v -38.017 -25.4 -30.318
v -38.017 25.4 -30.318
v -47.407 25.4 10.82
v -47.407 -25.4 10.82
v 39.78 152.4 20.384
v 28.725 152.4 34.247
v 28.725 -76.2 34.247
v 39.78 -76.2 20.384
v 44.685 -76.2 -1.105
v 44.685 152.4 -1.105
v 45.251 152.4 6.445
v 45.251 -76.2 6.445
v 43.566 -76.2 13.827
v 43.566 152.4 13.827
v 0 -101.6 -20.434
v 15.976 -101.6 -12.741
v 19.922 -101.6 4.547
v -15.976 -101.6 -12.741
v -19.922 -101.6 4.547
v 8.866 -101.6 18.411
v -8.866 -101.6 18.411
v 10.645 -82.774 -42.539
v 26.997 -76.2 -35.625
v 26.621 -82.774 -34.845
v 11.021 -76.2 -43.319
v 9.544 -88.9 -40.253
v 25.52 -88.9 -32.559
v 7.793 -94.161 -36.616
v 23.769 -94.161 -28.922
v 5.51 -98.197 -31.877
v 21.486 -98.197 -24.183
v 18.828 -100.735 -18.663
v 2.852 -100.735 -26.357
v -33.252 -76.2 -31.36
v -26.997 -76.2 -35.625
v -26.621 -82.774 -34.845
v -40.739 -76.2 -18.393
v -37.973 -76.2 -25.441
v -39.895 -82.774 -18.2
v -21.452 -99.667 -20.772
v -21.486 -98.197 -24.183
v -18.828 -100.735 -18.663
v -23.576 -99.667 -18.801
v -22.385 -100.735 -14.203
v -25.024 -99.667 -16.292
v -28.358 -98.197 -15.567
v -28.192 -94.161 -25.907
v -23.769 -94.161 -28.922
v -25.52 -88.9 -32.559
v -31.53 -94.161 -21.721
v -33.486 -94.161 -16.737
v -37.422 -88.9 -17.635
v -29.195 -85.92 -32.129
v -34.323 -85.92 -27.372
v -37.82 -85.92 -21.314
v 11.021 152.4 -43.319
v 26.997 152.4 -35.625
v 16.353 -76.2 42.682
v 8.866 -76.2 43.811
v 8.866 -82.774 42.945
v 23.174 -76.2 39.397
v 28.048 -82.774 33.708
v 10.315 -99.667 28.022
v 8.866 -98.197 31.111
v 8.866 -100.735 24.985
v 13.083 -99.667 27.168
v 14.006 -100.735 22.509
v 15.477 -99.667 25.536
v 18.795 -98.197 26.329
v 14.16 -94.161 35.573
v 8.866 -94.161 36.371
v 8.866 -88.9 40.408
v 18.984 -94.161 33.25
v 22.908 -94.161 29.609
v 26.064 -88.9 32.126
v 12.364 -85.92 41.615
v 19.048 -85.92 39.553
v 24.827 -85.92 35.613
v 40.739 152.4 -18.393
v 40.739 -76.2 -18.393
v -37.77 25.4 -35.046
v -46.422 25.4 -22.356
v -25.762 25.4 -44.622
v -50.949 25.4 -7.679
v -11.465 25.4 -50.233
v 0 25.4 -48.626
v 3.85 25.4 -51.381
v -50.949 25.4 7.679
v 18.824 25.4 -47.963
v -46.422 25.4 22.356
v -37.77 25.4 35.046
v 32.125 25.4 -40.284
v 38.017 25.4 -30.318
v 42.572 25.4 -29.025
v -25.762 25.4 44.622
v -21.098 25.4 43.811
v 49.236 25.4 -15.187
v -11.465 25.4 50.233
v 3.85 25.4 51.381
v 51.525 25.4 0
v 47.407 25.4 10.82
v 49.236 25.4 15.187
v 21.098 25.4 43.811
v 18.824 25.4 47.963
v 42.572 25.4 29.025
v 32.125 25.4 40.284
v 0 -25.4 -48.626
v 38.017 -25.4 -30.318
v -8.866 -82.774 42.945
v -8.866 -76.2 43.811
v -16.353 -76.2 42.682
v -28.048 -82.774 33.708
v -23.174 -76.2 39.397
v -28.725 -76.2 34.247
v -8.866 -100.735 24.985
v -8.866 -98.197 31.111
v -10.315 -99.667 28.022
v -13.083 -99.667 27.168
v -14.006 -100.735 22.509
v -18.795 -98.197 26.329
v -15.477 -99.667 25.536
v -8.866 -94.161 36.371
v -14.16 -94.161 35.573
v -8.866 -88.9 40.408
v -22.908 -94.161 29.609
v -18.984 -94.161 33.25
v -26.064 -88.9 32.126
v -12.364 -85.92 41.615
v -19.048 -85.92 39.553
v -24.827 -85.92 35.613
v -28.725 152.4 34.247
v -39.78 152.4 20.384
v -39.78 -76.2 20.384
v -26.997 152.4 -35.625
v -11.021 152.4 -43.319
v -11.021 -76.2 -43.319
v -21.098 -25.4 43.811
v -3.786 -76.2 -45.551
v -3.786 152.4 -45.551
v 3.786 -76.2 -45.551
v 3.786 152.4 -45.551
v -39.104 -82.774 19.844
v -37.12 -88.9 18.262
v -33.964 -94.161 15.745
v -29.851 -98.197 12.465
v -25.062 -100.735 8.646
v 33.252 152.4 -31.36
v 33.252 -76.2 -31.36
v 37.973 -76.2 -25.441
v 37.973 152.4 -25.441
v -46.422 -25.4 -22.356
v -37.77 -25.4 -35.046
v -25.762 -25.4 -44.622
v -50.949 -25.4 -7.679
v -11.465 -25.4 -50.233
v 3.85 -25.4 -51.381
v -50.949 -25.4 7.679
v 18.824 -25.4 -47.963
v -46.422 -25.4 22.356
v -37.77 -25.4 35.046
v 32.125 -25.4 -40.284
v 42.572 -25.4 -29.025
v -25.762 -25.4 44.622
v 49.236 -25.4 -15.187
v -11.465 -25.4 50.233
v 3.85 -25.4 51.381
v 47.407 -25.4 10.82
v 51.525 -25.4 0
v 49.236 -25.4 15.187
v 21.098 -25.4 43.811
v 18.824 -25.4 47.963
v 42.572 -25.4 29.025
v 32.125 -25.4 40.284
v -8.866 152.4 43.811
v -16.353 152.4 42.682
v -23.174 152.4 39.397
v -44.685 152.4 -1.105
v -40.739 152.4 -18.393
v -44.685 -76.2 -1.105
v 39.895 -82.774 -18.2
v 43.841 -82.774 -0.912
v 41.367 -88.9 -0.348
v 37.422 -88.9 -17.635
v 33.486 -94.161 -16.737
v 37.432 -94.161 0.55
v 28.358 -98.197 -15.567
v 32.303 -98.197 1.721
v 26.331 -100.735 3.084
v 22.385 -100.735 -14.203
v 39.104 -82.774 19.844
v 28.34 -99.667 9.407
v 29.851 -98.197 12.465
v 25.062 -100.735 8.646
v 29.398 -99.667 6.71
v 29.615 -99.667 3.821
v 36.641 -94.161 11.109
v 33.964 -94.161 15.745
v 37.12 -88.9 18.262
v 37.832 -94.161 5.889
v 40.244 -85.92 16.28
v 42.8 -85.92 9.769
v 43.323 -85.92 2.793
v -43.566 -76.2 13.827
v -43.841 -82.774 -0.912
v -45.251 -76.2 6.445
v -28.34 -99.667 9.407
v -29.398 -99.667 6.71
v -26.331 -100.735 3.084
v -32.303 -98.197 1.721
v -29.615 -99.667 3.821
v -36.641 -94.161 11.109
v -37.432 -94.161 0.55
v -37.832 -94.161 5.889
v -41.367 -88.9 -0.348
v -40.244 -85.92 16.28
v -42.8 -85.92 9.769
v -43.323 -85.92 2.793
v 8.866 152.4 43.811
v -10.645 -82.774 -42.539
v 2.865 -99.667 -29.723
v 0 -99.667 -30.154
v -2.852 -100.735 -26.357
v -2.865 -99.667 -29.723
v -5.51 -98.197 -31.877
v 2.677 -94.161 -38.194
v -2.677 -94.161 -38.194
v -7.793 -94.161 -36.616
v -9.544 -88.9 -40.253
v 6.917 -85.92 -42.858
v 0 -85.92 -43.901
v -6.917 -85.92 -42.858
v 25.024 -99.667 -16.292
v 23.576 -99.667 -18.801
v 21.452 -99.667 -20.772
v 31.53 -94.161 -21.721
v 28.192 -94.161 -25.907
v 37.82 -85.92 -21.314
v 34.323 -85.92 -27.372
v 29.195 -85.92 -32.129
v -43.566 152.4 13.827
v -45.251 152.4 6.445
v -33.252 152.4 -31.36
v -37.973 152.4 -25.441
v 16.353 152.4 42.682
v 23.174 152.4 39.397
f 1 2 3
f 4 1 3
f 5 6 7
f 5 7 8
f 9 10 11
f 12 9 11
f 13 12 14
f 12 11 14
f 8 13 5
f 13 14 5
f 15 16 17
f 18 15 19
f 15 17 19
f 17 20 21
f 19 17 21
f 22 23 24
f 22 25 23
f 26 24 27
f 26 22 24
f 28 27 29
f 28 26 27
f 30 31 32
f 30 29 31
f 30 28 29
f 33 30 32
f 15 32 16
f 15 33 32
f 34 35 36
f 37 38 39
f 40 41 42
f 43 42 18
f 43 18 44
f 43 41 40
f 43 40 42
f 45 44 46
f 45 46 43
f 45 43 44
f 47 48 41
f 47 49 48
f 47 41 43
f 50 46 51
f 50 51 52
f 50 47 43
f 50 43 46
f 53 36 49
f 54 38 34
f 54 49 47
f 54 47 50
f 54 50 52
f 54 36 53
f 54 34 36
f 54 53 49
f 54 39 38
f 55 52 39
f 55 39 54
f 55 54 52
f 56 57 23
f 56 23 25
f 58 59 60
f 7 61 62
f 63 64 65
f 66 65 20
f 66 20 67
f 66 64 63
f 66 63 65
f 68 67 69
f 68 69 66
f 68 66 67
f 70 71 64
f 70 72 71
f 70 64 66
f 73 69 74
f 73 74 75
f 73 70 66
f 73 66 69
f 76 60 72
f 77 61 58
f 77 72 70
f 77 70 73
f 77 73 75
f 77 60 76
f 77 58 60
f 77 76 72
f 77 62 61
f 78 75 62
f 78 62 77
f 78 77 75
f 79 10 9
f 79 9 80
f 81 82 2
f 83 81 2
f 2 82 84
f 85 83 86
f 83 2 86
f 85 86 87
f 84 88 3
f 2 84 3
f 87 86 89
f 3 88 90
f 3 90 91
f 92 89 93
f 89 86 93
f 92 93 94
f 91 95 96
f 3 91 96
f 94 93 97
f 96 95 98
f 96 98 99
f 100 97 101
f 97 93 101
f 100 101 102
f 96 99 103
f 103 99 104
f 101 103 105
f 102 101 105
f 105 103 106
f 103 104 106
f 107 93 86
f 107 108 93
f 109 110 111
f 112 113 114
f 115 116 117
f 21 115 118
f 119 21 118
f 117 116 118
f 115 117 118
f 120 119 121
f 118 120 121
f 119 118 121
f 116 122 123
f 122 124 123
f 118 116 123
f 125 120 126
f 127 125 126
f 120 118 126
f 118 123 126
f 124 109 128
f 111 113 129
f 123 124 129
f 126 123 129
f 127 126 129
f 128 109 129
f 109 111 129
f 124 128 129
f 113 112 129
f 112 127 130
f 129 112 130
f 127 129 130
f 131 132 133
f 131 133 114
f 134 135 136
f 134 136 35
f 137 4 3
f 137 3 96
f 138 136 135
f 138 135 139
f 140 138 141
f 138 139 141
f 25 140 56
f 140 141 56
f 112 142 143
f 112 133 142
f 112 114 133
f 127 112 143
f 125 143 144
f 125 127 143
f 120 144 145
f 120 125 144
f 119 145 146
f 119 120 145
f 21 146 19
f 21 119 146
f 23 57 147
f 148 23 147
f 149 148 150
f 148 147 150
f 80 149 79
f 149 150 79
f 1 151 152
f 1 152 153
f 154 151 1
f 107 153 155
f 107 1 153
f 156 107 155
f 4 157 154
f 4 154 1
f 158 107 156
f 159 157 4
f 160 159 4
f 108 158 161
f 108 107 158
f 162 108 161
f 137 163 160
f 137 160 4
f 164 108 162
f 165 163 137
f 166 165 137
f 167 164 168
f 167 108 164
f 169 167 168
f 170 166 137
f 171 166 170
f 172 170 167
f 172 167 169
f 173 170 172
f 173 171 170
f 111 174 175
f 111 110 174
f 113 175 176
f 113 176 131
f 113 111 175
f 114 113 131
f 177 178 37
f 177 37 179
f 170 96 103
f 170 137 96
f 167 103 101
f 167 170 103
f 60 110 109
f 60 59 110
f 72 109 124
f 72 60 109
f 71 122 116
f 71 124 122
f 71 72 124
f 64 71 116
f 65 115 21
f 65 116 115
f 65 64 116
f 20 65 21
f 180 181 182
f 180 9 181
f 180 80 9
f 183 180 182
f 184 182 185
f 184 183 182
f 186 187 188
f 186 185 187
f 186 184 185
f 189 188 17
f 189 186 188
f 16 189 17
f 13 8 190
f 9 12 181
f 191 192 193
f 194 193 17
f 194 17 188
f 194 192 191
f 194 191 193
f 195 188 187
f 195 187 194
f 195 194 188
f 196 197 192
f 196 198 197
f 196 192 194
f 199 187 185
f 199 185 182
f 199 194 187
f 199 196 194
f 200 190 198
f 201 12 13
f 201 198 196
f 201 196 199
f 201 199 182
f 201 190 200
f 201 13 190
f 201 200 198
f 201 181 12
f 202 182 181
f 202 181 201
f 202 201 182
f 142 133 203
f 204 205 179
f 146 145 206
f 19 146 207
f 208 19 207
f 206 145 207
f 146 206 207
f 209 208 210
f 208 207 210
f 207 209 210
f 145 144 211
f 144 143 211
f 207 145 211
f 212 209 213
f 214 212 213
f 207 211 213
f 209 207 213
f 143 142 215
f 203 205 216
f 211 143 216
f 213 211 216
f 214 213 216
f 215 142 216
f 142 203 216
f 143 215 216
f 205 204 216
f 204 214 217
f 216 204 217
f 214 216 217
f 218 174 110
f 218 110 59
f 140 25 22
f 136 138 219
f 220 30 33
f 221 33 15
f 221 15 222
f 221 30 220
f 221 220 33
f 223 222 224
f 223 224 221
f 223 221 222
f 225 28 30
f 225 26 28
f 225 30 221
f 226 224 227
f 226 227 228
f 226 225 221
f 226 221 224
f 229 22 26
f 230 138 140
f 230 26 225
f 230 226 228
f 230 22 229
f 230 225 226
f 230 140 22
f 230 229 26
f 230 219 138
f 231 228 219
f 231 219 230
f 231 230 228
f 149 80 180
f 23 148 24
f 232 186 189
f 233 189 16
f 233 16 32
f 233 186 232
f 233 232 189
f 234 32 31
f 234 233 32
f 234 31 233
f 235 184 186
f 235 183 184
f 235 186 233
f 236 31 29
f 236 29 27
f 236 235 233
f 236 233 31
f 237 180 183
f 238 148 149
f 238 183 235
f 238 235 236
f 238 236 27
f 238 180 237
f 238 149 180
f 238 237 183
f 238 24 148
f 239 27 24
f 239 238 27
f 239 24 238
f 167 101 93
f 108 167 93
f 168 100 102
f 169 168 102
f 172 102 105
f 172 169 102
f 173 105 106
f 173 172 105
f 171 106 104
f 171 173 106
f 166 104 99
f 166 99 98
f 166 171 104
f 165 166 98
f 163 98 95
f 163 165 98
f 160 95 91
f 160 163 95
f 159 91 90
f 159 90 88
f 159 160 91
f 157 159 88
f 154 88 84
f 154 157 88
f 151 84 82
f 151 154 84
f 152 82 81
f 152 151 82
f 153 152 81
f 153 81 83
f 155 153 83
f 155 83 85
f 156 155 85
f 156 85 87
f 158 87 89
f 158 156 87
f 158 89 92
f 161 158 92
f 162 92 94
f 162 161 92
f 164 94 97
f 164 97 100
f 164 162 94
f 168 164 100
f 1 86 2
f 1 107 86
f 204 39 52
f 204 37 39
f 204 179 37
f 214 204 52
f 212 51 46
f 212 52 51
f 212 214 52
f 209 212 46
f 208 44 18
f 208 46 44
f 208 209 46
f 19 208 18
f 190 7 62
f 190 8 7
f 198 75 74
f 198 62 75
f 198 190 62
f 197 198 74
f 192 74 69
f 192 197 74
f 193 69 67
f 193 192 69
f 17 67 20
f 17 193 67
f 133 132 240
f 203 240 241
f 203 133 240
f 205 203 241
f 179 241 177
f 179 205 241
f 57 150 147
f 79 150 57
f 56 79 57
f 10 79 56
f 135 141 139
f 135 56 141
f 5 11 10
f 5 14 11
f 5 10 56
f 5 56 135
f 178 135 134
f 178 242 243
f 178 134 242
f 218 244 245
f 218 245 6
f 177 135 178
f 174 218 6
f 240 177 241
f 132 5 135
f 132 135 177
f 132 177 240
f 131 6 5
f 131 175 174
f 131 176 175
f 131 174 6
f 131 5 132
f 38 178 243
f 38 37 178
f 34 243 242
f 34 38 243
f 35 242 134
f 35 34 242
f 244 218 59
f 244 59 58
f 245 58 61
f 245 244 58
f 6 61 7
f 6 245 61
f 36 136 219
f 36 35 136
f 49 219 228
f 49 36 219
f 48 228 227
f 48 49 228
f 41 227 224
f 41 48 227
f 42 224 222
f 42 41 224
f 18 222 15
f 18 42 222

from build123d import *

# Parameters (mm, degrees)
F0_R     = 51.5249120955
F1_DEPTH = 25.4
F3_DEPTH = 127
F4_R     = 25.4


with BuildPart() as f1:
    # F0 (on Front) → F1 (new body, symmetric)
    with BuildSketch(Plane.XZ):
        Circle(F0_R)
        Polygon((-47.4069179748, 10.8203196687), (-21.0980633275, 43.8105799258), (21.0980633275, 43.8105799258), (47.4069179748, 10.8203196687), (38.0173964622, -30.3178619932), (0, -48.6260752025), (-38.0173964622, -30.3178619932), align=None, mode=Mode.SUBTRACT)
    extrude(amount=F1_DEPTH, both=True)


with BuildPart() as f3:
    # F2 (on face) → F3 (new body, symmetric)
    with BuildSketch(Plane(origin=(0, 25.4, 0), x_dir=(-1, 0, 0), z_dir=(0, 1, 0))):
        Polygon((21.0980633275, 43.8105799258), (-21.0980633275, 43.8105799258), (-47.4069179748, 10.8203196687), (-38.0173964622, -30.3178619932), (0, -48.6260752025), (38.0173964622, -30.3178619932), (47.4069179748, 10.8203196687), align=None)
    extrude(amount=F3_DEPTH, both=True)

    # F4
    f4_edges = [f3.edges().sort_by_distance(p)[0] for p in [
        (0, -101.6, 43.81058),
        (-34.252491, -101.6, 27.31545),
        (34.252491, -101.6, 27.31545),
        (42.712157, -101.6, -9.748771),
        (19.008698, -101.6, -39.471969),
        (-19.008698, -101.6, -39.471969),
        (-42.712157, -101.6, -9.748771),
        (47.406918, 25.4, 10.82032),
        (21.098063, 25.4, 43.81058),
        (-21.098063, 25.4, 43.81058),
        (-47.406918, 25.4, 10.82032),
        (-38.017396, 25.4, -30.317862),
        (38.017396, 25.4, -30.317862),
        (0, 25.4, -48.626075),
    ]]
    fillet(f4_edges, radius=F4_R)


solid = Compound([f1.part, f3.part])
